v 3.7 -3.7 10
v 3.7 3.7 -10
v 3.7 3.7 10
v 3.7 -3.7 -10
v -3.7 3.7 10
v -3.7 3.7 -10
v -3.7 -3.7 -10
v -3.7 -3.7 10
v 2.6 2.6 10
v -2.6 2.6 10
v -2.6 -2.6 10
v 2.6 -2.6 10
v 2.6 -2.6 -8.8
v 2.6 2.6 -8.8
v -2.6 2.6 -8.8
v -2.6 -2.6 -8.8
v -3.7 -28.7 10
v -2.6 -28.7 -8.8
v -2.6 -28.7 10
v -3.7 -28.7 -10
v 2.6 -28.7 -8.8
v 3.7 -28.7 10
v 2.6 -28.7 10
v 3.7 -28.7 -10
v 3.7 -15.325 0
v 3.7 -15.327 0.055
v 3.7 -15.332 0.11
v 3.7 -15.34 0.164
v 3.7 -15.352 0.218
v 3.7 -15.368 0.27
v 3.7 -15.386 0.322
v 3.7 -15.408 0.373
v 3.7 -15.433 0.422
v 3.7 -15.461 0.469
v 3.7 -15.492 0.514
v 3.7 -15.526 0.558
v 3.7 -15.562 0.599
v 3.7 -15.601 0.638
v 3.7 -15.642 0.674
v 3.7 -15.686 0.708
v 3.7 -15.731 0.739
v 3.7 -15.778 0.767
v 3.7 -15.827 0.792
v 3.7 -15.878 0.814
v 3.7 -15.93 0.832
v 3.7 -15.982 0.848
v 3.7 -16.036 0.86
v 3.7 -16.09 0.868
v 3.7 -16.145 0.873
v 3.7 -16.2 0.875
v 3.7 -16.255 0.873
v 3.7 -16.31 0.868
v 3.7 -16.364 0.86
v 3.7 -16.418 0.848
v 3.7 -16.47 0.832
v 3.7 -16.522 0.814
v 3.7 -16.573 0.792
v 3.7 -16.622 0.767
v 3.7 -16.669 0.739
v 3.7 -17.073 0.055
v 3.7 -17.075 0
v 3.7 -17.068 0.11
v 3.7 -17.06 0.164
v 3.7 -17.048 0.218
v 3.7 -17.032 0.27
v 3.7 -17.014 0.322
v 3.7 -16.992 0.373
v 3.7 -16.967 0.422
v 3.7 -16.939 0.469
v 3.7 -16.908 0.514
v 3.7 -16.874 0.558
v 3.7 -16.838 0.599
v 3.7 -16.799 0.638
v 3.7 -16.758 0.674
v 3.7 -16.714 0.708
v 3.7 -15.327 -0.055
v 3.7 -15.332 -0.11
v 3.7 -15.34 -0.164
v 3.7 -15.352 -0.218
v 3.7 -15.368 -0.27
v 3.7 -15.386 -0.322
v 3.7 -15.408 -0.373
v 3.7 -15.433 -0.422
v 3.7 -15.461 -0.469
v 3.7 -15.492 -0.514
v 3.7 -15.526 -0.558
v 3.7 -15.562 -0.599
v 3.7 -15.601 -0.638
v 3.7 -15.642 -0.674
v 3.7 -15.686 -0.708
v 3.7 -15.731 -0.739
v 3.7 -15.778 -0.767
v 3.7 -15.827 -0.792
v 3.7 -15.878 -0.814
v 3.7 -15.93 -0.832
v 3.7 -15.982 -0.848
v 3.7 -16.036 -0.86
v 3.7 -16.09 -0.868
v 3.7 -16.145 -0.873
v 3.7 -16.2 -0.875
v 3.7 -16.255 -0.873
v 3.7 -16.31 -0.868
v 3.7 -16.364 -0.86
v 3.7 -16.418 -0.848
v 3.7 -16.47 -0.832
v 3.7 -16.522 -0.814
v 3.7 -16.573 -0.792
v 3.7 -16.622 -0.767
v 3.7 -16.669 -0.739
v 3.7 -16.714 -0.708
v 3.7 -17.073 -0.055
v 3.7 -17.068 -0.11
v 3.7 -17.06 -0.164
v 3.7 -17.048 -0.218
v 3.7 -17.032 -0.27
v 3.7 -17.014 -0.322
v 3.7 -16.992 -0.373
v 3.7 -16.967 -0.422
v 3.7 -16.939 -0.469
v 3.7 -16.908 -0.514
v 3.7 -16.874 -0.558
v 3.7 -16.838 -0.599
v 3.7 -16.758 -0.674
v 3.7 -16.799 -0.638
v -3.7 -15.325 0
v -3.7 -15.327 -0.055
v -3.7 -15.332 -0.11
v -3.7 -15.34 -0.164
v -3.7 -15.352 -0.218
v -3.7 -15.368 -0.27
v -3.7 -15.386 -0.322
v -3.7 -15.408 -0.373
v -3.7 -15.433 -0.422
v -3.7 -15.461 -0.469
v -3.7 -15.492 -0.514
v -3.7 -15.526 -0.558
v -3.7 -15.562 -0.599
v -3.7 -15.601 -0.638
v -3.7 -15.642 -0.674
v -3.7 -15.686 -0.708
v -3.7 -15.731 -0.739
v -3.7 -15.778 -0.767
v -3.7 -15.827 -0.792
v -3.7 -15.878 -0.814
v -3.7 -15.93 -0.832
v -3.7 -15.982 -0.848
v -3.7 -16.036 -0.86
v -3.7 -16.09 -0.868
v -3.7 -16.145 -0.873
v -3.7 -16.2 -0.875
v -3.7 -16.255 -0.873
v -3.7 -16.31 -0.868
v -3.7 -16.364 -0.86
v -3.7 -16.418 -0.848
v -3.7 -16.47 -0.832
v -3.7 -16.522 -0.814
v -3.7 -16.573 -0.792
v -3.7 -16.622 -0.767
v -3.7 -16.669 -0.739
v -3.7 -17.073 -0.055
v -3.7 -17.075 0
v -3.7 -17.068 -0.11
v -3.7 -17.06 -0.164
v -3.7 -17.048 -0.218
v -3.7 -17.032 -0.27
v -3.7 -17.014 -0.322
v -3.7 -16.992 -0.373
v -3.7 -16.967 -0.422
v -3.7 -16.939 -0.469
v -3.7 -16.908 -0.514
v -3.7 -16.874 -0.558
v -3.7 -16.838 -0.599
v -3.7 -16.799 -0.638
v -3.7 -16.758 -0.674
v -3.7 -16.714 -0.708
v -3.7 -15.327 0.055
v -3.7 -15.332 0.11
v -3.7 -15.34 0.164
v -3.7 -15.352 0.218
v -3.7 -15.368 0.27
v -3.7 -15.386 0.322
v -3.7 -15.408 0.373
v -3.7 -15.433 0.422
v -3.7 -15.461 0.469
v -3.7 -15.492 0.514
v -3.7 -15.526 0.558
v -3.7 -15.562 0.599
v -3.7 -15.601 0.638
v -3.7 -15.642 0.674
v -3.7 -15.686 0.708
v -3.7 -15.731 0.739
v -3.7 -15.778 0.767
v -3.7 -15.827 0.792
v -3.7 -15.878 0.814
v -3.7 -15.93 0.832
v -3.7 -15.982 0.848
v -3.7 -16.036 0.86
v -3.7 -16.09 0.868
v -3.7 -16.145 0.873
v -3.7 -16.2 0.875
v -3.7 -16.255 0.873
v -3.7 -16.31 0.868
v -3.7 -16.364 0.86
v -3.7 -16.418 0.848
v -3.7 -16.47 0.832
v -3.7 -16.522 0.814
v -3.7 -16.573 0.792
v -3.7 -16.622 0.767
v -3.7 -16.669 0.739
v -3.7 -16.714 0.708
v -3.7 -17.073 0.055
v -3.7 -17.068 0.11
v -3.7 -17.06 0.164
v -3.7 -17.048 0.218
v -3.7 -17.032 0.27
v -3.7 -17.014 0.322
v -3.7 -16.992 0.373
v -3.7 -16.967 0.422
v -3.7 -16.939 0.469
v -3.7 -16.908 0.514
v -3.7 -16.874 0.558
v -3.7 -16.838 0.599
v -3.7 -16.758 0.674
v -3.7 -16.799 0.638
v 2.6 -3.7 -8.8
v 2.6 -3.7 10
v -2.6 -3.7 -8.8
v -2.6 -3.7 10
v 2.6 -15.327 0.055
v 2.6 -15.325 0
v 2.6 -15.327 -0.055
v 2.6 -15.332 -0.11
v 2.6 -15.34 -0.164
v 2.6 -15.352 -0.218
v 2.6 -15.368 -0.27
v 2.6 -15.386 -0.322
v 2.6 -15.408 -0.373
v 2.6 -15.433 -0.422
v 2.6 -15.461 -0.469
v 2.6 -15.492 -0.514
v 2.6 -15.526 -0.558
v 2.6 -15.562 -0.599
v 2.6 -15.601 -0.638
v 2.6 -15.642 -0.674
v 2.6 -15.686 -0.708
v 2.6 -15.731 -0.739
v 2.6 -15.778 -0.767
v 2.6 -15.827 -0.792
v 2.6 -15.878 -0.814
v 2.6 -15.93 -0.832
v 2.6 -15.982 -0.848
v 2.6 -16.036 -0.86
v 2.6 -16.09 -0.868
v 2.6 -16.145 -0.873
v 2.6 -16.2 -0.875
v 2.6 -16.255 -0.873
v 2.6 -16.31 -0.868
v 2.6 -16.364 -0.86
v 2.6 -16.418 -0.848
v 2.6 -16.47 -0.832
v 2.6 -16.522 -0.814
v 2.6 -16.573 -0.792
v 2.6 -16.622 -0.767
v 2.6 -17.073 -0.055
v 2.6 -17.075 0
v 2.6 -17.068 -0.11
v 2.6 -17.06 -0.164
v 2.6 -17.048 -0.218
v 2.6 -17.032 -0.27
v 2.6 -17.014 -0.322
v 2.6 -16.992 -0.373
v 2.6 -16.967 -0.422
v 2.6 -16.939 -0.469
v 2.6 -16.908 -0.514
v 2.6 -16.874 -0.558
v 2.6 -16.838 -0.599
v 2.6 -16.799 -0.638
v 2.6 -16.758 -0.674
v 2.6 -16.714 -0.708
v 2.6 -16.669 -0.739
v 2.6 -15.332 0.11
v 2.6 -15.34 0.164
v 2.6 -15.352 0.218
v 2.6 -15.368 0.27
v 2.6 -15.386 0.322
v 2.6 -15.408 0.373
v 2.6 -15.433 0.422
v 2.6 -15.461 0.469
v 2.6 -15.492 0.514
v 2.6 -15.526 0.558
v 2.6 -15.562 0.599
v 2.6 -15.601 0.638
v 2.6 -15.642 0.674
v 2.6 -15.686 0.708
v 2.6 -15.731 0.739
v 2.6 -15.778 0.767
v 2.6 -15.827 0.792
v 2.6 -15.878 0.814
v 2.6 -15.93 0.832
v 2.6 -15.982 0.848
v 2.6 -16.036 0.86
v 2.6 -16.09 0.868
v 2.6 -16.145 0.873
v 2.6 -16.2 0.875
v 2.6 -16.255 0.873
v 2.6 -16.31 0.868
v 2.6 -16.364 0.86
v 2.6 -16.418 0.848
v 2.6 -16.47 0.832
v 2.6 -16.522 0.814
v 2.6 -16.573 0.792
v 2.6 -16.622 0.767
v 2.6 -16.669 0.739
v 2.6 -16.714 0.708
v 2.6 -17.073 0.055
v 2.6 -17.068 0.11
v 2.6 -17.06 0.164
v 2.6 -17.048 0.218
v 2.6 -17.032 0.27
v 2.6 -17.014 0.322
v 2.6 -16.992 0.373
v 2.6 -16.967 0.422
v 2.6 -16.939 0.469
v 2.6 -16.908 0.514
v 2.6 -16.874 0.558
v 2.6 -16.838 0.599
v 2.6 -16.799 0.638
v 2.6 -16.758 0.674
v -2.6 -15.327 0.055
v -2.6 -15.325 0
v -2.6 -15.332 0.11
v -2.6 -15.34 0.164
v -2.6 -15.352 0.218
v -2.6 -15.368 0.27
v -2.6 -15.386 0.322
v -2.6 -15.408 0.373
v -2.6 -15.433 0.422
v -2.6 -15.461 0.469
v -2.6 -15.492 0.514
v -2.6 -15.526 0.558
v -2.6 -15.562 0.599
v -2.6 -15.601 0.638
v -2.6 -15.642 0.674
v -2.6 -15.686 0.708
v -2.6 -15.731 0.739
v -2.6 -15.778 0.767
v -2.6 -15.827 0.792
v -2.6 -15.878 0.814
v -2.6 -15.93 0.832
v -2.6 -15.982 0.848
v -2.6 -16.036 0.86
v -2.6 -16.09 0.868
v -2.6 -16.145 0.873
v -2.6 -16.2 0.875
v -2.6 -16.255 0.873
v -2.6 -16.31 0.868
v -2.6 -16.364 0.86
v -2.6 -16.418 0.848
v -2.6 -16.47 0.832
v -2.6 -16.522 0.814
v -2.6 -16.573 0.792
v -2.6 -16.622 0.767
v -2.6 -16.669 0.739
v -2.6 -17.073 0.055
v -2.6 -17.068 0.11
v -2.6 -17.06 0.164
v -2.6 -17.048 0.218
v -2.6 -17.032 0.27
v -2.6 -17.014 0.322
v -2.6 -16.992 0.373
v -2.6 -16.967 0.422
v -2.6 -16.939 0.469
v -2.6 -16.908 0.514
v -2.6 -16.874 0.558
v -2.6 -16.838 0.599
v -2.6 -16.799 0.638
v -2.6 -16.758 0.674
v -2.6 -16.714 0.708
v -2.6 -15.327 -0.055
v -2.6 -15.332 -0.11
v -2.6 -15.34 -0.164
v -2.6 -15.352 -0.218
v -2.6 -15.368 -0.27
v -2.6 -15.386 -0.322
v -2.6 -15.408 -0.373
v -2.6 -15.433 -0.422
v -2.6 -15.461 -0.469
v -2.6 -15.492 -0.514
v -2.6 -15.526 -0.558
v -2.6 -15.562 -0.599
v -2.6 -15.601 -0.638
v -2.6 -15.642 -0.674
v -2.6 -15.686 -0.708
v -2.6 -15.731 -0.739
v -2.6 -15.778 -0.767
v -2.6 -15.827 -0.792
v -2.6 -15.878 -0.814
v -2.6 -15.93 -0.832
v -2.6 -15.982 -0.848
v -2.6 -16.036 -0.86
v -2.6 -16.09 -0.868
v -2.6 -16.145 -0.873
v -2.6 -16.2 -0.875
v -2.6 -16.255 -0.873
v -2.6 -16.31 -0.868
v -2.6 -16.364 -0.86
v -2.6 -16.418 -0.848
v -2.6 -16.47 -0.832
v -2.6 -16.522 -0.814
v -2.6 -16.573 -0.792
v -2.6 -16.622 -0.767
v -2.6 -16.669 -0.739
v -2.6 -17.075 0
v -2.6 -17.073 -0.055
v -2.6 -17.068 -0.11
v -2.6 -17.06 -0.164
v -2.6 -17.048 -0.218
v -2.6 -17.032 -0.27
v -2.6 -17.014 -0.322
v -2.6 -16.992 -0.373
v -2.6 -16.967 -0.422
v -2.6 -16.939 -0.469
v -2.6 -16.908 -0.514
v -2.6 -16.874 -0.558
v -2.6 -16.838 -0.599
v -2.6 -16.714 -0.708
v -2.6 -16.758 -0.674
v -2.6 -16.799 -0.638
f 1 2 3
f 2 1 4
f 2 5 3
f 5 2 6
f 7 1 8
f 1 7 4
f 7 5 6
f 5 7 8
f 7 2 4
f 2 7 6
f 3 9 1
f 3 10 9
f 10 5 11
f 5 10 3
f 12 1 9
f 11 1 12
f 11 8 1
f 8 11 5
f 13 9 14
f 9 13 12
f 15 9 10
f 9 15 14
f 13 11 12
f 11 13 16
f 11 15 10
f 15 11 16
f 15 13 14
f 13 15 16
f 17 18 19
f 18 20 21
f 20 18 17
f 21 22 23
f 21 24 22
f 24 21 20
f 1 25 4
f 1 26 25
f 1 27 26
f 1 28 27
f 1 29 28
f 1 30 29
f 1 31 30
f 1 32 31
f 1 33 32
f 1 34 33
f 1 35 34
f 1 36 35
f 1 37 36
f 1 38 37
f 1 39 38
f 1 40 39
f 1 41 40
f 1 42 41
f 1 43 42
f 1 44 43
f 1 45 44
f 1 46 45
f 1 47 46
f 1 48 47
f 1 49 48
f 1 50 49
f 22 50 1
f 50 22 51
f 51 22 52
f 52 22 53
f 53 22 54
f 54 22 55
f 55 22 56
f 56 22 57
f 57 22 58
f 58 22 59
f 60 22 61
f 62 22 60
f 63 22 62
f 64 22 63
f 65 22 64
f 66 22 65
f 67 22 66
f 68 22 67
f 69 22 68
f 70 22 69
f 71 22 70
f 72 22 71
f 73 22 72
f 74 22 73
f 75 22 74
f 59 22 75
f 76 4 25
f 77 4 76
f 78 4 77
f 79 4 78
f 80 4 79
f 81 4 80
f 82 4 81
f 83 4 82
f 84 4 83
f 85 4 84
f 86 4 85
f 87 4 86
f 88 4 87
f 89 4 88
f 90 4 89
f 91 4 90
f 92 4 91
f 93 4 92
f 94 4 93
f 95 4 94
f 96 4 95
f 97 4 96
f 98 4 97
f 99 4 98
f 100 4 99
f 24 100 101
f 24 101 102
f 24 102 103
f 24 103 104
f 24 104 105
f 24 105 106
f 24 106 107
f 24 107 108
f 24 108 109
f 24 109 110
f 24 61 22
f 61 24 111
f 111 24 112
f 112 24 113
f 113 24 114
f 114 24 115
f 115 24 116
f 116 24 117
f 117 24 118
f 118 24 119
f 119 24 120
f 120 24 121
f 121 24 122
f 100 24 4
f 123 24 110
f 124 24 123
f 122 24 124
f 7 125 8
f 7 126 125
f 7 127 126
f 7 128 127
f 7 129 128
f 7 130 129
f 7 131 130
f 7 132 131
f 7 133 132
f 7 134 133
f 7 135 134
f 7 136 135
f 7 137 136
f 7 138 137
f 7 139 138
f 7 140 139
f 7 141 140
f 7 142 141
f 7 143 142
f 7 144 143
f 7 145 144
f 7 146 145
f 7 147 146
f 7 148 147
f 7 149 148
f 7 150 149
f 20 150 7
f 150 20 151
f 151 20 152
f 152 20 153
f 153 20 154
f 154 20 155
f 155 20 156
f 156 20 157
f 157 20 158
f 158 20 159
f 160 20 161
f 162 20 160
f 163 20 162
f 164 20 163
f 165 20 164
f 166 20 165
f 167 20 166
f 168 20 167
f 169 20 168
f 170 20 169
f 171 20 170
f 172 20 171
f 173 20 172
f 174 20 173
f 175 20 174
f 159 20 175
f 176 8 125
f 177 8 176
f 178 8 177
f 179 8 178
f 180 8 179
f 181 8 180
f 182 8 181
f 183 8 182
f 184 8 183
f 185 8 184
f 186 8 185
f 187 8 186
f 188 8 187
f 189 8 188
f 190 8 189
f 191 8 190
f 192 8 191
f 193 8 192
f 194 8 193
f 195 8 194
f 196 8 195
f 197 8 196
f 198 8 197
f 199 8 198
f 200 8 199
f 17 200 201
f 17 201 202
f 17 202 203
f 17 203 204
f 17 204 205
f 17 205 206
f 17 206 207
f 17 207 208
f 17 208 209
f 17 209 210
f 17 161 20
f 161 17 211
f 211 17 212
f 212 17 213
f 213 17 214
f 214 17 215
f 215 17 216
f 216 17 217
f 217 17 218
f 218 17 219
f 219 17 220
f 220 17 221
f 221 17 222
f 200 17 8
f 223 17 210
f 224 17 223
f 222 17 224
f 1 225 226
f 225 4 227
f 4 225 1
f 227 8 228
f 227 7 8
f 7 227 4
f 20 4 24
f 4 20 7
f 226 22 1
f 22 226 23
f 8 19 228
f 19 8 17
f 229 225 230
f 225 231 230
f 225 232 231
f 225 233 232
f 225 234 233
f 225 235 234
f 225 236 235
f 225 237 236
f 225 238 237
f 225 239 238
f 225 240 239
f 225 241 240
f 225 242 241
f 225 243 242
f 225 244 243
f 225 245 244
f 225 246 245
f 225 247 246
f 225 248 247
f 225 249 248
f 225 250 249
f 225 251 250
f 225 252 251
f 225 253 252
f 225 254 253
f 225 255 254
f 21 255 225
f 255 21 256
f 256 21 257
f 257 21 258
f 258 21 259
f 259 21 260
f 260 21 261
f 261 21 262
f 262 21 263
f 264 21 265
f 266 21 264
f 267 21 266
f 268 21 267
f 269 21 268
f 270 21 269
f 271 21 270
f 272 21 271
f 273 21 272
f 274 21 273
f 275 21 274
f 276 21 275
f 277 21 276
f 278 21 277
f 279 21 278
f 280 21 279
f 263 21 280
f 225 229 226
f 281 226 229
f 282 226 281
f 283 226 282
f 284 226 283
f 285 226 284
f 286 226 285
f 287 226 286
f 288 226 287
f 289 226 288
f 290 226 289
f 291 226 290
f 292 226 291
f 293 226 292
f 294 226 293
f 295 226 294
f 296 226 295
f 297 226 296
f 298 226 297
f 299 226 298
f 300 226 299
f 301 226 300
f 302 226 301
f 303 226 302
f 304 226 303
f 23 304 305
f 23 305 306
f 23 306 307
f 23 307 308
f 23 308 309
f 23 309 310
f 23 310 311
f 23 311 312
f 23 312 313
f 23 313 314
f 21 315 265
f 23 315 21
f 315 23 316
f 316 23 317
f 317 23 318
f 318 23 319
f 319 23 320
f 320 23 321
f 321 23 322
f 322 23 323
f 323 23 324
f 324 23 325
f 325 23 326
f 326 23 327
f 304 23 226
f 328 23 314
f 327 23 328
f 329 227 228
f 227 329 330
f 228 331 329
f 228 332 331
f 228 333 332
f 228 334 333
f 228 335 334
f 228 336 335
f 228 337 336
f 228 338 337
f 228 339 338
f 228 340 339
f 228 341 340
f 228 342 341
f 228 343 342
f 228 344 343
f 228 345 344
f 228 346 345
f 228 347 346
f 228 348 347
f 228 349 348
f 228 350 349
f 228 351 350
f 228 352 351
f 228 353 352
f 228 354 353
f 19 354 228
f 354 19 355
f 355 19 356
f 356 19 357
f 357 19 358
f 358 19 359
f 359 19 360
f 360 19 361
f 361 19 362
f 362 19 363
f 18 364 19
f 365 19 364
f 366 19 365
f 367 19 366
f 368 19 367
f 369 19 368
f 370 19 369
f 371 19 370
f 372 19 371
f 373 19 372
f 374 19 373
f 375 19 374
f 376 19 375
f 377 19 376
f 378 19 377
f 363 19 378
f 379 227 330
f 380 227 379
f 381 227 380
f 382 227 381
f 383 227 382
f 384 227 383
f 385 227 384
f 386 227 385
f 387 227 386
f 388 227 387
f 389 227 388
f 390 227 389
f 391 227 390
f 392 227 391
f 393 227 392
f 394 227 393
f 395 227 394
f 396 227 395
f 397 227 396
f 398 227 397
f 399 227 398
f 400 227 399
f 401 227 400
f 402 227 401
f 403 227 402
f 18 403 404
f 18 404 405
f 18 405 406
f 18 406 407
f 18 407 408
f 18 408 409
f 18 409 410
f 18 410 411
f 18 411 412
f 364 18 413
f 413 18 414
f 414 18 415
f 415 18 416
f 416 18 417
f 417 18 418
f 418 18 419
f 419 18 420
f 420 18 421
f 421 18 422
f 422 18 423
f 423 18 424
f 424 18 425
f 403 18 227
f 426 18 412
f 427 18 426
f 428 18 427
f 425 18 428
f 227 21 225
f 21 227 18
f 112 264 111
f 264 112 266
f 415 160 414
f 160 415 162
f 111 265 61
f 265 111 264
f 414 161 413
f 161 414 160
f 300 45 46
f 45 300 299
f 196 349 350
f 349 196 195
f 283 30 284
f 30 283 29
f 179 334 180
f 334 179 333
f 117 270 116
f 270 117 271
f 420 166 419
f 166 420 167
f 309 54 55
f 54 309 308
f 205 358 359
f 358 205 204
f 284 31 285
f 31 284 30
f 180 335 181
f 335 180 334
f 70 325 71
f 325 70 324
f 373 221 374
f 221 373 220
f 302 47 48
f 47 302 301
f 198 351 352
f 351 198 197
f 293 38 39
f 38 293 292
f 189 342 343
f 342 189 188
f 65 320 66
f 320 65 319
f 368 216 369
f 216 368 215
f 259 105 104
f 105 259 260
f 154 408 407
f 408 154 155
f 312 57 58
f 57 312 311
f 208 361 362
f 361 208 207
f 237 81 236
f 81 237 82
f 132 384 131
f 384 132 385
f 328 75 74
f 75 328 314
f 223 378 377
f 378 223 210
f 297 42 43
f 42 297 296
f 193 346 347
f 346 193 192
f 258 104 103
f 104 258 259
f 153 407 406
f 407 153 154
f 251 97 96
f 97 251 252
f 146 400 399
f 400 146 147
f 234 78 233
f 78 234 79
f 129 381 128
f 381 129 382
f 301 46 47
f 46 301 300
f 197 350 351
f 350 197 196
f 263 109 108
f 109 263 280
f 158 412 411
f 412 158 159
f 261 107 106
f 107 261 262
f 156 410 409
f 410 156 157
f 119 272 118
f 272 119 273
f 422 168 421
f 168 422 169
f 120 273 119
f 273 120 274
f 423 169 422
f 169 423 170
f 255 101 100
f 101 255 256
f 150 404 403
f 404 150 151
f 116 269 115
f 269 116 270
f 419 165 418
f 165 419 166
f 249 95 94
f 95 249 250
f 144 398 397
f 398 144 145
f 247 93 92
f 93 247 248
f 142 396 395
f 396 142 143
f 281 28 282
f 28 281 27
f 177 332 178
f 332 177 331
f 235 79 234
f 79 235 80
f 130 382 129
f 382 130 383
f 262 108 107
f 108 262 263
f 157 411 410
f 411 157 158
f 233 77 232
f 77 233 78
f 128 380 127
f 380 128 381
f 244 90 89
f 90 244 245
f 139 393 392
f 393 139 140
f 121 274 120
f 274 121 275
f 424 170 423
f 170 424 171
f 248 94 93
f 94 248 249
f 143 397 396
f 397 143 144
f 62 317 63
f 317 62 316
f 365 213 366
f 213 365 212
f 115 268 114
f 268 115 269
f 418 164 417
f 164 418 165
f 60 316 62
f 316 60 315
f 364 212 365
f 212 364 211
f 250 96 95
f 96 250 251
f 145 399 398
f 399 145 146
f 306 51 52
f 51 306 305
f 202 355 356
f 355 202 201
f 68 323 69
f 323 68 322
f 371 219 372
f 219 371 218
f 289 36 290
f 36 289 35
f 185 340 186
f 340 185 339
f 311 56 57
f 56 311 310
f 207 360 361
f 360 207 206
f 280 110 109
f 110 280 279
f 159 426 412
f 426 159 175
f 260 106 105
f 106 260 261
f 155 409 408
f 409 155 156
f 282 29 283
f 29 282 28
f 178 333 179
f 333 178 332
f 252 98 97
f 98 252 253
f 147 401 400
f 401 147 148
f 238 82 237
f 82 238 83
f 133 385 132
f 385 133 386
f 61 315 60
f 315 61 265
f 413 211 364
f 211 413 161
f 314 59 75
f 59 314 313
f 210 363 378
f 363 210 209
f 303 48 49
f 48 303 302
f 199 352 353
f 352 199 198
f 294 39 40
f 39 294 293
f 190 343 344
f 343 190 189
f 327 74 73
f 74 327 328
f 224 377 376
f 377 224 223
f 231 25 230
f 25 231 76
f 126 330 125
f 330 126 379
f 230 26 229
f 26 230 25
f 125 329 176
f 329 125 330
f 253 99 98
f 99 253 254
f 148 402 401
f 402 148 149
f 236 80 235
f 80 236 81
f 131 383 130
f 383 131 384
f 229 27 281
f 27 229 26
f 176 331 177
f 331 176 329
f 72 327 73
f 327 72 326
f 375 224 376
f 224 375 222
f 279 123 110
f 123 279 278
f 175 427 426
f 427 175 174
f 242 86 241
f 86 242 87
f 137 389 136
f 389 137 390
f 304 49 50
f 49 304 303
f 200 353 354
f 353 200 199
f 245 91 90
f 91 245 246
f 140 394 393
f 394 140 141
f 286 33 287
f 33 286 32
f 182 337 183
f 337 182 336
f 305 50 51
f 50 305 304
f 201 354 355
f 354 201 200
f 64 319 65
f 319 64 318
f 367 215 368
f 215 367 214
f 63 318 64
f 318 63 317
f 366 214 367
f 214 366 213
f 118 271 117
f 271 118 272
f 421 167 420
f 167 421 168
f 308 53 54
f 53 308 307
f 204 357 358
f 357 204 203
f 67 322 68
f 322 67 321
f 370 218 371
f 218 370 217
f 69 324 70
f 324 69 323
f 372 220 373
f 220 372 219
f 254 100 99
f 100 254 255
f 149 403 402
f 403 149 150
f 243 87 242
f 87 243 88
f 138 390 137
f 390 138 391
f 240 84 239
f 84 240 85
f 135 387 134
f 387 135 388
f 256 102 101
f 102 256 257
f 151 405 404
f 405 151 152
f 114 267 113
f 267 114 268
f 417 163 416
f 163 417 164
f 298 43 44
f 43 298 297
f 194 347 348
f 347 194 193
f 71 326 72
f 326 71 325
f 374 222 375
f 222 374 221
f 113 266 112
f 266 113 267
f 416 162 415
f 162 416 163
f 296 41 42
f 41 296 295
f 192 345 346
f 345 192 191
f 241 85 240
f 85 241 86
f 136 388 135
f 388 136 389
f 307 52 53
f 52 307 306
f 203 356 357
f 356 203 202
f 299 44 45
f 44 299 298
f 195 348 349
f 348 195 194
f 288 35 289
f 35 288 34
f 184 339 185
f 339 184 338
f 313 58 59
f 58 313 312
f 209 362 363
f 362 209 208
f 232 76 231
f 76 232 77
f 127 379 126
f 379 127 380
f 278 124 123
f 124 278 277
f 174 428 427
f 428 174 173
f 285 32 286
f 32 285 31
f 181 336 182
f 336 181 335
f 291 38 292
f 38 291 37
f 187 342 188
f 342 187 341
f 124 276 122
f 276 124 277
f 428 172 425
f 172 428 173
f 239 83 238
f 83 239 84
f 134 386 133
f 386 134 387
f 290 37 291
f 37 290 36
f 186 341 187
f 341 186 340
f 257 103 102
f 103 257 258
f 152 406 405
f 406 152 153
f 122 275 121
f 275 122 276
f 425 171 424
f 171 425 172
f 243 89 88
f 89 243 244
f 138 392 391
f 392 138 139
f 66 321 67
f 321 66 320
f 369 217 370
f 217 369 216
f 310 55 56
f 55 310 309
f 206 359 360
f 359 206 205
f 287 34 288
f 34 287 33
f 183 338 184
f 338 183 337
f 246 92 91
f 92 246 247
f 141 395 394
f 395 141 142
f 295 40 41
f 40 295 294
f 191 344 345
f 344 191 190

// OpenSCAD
//celkovy cas: 4:07

//variables
/* [Hidden] */
//fragment number
$fn = 100;

/* [Main] */
//thickness of desks in mm
thickness_of_desks=5;
//thickness of walls in mm
thickness_of_walls = 1.2;
//length of connectors in mm
length_of_connectors = 25; 
//width of connectors 
width_of_connectors = 20;

number_of_connectors = 1; //[1:4]

secure_filament_thickness = 1.75; //[1.75,3.0]

/* [Addons] */
//Hinges or Arcs or Both - when both, arcs dont appear where hinge is
addons="none"; //[none,hinges,arcs,both]
// set on which axis you need hinges - this means the rotation of the connector in shelf
hinge_axis = "x"; //[x,y]

hinge_rotation = "up"; //[up,down]
//make sure customizer shows up all hinges(use rotation a lot, its a bit buggy)
hinges_positon="both_up";//[left_down,right_down,both_down,left_up,right_up,both_up,all]

arcs = (addons=="arcs" || addons=="both") ? true : false;

//arcs = true; //set to true if you want round shapes in the corner not recommended if building shelf with doors - using hinges, or with drawers

hinges = (addons=="hinges" || addons=="both") ? true : false;

//hinges = true; // set true if you want hinges for some door

hpos1 = ((hinges_positon=="right_up"||hinges_positon=="both_up"||hinges_positon=="all")&&(number_of_connectors==4 || (number_of_connectors==3 && hinge_axis =="y" )))? true:false; //position of hinge
hpos2 = (hinges_positon=="right_down"||hinges_positon=="both_down"||hinges_positon=="all")? true:false; //position of hinge
hpos3 = ((hinges_positon=="left_up"||hinges_positon=="both_up"||hinges_positon=="all")&&(number_of_connectors==4 || (number_of_connectors==3 && hinge_axis =="y" )))? true:false; //position of hinge
hpos4 = (hinges_positon=="left_down"||hinges_positon=="both_down"||hinges_positon=="all")? true:false; //position of hinge
rotate([-90,0,0])union(){

if(number_of_connectors==4){
  difference(){
cube([thickness_of_desks+(thickness_of_walls*2),width_of_connectors,thickness_of_desks+(thickness_of_walls*2)], center= true);
translate([0,-thickness_of_walls/2,0])cube([thickness_of_desks+2*thickness_of_walls,width_of_connectors-thickness_of_walls,thickness_of_desks+0.2], center= true);
translate([0,-thickness_of_walls/2,0])cube([thickness_of_desks+0.2,width_of_connectors-thickness_of_walls,thickness_of_desks+2*thickness_of_walls], center= true);}
}
else if(number_of_connectors==2){
difference(){
cube([thickness_of_desks+(thickness_of_walls*2),width_of_connectors,thickness_of_desks+(thickness_of_walls*2)], center= true);

translate([-(+thickness_of_walls)/2,-thickness_of_walls/2,0])cube([thickness_of_desks+thickness_of_walls+0.2,width_of_connectors-thickness_of_walls,thickness_of_desks+0.2], center= true);
translate([0,-thickness_of_walls/2,-(+thickness_of_walls)/2])cube([thickness_of_desks+0.2,width_of_connectors-thickness_of_walls,thickness_of_desks+thickness_of_walls+0.2], center= true);

}}
else if(number_of_connectors==3){
difference(){
cube([thickness_of_desks+(thickness_of_walls*2),width_of_connectors,thickness_of_desks+(thickness_of_walls*2)], center= true);
translate([0,-thickness_of_walls/2-0.5,0])cube([thickness_of_desks+0.2,width_of_connectors-thickness_of_walls+1,thickness_of_desks+2*thickness_of_walls+1], center= true);
translate([-thickness_of_desks+1,-thickness_of_walls/2-0.5,0])cube([thickness_of_desks+0.2,width_of_connectors-thickness_of_walls+1,thickness_of_desks+0.2], center= true);

}}
else if(number_of_connectors==1){
difference(){
cube([thickness_of_desks+(thickness_of_walls*2),width_of_connectors,thickness_of_desks+(thickness_of_walls*2)], center= true);
translate([0,-thickness_of_walls/2,0])cube([thickness_of_desks+0.2,width_of_connectors-thickness_of_walls,thickness_of_desks+0.2], center= true);

}}
for( i = [1 : number_of_connectors]){
   rotate([0,i*90,0])connector();
}

if(arcs==true && hinges_positon!="all" ){
    if((hpos1!=true && number_of_connectors ==4 && hinge_axis == "x")||(hpos2!=true && number_of_connectors ==4 && hinge_axis == "y") )
        rotate([0,4*90,0])arc();
    if((hpos2!=true && number_of_connectors >1&&hinge_axis == "x")||(hpos4!=true && number_of_connectors >1&&hinge_axis == "y"))
        rotate([0,1*90,0])arc();
    if((hpos3!=true && number_of_connectors>3&&hinge_axis == "x")||(hpos1!=true && number_of_connectors>3&&hinge_axis == "y"))
        rotate([0,3*90,0])arc();
    if((hpos4!=true && number_of_connectors>2&&hinge_axis == "x")||(hpos3 !=true && number_of_connectors>2 && hinge_axis == "y"))
        rotate([0,2*90,0])arc();
}
if(hinges==true){
rot=hinge_axis=="x"? 90:0;
hrot = hinge_rotation=="up"?0:(-length_of_connectors/4);
if(hpos1==true){
    translate([0,0,0
    ])rotate([0,rot,0])hinges(hrot);
}
if(hpos2==true){
    rotate([0,rot,0])translate([0,0,-thickness_of_desks/2-thickness_of_walls-length_of_connectors+length_of_connectors/4-length_of_connectors-thickness_of_desks/2-thickness_of_walls
    ])hinges(hrot);
}
if(hpos3==true){
    translate([0,-thickness_of_desks+width_of_connectors,0])rotate([0,-rot,180])hinges(hrot);
}
if(hpos4==true){
    rotate([0,-rot,180])translate([0,thickness_of_desks-width_of_connectors,-thickness_of_desks/2-thickness_of_walls-length_of_connectors+length_of_connectors/4-length_of_connectors-thickness_of_desks/2-thickness_of_walls])hinges(hrot);
}
}
}
module connector(){
    translate([(thickness_of_desks+(thickness_of_walls*2))/2,-width_of_connectors/2,-(thickness_of_desks+(thickness_of_walls*2))/2])difference(){
cube([length_of_connectors,width_of_connectors,thickness_of_desks+(thickness_of_walls*2)]);
translate([-0.5,-thickness_of_walls,thickness_of_walls-0.1])cube([length_of_connectors+0.5+1,width_of_connectors,thickness_of_desks+0.2]);
translate([length_of_connectors/2,width_of_connectors/2,-1])cylinder(h=thickness_of_desks+(thickness_of_walls*2+2), d=secure_filament_thickness );
}
}

module arc(){
translate([(0.1+(length_of_connectors/2)-secure_filament_thickness)+thickness_of_desks/2,width_of_connectors/2,-((0.1+(length_of_connectors/2)-secure_filament_thickness)+thickness_of_desks/2)])rotate([90,270,0])difference(){
intersection(){
union(){
cylinder(h=width_of_connectors, r = (length_of_connectors/2)-secure_filament_thickness);
cube([(length_of_connectors/2)-secure_filament_thickness,(length_of_connectors/2)-secure_filament_thickness,thickness_of_walls]);  
}
cube([(length_of_connectors/2)-secure_filament_thickness,(length_of_connectors/2)-secure_filament_thickness,width_of_connectors]);
}
translate([0,0,-1])cylinder(h=width_of_connectors+2, r = (length_of_connectors/2)-(secure_filament_thickness+thickness_of_walls-0.1));
}
}
module hinges(rotation){
translate([thickness_of_desks/2+thickness_of_walls,width_of_connectors/2-thickness_of_desks,thickness_of_desks/2+thickness_of_walls+length_of_connectors-length_of_connectors/4
    ])
union(){
    
translate([thickness_of_desks/2+thickness_of_walls,(thickness_of_desks-0.05)/2,rotation])
        cylinder(h=length_of_connectors/2, d=thickness_of_desks-0.05);
    
translate([0,0,0])cube([thickness_of_desks/2+thickness_of_walls,thickness_of_desks,length_of_connectors/4]);
}    

}

// preview[view:south west, tilt:top]
